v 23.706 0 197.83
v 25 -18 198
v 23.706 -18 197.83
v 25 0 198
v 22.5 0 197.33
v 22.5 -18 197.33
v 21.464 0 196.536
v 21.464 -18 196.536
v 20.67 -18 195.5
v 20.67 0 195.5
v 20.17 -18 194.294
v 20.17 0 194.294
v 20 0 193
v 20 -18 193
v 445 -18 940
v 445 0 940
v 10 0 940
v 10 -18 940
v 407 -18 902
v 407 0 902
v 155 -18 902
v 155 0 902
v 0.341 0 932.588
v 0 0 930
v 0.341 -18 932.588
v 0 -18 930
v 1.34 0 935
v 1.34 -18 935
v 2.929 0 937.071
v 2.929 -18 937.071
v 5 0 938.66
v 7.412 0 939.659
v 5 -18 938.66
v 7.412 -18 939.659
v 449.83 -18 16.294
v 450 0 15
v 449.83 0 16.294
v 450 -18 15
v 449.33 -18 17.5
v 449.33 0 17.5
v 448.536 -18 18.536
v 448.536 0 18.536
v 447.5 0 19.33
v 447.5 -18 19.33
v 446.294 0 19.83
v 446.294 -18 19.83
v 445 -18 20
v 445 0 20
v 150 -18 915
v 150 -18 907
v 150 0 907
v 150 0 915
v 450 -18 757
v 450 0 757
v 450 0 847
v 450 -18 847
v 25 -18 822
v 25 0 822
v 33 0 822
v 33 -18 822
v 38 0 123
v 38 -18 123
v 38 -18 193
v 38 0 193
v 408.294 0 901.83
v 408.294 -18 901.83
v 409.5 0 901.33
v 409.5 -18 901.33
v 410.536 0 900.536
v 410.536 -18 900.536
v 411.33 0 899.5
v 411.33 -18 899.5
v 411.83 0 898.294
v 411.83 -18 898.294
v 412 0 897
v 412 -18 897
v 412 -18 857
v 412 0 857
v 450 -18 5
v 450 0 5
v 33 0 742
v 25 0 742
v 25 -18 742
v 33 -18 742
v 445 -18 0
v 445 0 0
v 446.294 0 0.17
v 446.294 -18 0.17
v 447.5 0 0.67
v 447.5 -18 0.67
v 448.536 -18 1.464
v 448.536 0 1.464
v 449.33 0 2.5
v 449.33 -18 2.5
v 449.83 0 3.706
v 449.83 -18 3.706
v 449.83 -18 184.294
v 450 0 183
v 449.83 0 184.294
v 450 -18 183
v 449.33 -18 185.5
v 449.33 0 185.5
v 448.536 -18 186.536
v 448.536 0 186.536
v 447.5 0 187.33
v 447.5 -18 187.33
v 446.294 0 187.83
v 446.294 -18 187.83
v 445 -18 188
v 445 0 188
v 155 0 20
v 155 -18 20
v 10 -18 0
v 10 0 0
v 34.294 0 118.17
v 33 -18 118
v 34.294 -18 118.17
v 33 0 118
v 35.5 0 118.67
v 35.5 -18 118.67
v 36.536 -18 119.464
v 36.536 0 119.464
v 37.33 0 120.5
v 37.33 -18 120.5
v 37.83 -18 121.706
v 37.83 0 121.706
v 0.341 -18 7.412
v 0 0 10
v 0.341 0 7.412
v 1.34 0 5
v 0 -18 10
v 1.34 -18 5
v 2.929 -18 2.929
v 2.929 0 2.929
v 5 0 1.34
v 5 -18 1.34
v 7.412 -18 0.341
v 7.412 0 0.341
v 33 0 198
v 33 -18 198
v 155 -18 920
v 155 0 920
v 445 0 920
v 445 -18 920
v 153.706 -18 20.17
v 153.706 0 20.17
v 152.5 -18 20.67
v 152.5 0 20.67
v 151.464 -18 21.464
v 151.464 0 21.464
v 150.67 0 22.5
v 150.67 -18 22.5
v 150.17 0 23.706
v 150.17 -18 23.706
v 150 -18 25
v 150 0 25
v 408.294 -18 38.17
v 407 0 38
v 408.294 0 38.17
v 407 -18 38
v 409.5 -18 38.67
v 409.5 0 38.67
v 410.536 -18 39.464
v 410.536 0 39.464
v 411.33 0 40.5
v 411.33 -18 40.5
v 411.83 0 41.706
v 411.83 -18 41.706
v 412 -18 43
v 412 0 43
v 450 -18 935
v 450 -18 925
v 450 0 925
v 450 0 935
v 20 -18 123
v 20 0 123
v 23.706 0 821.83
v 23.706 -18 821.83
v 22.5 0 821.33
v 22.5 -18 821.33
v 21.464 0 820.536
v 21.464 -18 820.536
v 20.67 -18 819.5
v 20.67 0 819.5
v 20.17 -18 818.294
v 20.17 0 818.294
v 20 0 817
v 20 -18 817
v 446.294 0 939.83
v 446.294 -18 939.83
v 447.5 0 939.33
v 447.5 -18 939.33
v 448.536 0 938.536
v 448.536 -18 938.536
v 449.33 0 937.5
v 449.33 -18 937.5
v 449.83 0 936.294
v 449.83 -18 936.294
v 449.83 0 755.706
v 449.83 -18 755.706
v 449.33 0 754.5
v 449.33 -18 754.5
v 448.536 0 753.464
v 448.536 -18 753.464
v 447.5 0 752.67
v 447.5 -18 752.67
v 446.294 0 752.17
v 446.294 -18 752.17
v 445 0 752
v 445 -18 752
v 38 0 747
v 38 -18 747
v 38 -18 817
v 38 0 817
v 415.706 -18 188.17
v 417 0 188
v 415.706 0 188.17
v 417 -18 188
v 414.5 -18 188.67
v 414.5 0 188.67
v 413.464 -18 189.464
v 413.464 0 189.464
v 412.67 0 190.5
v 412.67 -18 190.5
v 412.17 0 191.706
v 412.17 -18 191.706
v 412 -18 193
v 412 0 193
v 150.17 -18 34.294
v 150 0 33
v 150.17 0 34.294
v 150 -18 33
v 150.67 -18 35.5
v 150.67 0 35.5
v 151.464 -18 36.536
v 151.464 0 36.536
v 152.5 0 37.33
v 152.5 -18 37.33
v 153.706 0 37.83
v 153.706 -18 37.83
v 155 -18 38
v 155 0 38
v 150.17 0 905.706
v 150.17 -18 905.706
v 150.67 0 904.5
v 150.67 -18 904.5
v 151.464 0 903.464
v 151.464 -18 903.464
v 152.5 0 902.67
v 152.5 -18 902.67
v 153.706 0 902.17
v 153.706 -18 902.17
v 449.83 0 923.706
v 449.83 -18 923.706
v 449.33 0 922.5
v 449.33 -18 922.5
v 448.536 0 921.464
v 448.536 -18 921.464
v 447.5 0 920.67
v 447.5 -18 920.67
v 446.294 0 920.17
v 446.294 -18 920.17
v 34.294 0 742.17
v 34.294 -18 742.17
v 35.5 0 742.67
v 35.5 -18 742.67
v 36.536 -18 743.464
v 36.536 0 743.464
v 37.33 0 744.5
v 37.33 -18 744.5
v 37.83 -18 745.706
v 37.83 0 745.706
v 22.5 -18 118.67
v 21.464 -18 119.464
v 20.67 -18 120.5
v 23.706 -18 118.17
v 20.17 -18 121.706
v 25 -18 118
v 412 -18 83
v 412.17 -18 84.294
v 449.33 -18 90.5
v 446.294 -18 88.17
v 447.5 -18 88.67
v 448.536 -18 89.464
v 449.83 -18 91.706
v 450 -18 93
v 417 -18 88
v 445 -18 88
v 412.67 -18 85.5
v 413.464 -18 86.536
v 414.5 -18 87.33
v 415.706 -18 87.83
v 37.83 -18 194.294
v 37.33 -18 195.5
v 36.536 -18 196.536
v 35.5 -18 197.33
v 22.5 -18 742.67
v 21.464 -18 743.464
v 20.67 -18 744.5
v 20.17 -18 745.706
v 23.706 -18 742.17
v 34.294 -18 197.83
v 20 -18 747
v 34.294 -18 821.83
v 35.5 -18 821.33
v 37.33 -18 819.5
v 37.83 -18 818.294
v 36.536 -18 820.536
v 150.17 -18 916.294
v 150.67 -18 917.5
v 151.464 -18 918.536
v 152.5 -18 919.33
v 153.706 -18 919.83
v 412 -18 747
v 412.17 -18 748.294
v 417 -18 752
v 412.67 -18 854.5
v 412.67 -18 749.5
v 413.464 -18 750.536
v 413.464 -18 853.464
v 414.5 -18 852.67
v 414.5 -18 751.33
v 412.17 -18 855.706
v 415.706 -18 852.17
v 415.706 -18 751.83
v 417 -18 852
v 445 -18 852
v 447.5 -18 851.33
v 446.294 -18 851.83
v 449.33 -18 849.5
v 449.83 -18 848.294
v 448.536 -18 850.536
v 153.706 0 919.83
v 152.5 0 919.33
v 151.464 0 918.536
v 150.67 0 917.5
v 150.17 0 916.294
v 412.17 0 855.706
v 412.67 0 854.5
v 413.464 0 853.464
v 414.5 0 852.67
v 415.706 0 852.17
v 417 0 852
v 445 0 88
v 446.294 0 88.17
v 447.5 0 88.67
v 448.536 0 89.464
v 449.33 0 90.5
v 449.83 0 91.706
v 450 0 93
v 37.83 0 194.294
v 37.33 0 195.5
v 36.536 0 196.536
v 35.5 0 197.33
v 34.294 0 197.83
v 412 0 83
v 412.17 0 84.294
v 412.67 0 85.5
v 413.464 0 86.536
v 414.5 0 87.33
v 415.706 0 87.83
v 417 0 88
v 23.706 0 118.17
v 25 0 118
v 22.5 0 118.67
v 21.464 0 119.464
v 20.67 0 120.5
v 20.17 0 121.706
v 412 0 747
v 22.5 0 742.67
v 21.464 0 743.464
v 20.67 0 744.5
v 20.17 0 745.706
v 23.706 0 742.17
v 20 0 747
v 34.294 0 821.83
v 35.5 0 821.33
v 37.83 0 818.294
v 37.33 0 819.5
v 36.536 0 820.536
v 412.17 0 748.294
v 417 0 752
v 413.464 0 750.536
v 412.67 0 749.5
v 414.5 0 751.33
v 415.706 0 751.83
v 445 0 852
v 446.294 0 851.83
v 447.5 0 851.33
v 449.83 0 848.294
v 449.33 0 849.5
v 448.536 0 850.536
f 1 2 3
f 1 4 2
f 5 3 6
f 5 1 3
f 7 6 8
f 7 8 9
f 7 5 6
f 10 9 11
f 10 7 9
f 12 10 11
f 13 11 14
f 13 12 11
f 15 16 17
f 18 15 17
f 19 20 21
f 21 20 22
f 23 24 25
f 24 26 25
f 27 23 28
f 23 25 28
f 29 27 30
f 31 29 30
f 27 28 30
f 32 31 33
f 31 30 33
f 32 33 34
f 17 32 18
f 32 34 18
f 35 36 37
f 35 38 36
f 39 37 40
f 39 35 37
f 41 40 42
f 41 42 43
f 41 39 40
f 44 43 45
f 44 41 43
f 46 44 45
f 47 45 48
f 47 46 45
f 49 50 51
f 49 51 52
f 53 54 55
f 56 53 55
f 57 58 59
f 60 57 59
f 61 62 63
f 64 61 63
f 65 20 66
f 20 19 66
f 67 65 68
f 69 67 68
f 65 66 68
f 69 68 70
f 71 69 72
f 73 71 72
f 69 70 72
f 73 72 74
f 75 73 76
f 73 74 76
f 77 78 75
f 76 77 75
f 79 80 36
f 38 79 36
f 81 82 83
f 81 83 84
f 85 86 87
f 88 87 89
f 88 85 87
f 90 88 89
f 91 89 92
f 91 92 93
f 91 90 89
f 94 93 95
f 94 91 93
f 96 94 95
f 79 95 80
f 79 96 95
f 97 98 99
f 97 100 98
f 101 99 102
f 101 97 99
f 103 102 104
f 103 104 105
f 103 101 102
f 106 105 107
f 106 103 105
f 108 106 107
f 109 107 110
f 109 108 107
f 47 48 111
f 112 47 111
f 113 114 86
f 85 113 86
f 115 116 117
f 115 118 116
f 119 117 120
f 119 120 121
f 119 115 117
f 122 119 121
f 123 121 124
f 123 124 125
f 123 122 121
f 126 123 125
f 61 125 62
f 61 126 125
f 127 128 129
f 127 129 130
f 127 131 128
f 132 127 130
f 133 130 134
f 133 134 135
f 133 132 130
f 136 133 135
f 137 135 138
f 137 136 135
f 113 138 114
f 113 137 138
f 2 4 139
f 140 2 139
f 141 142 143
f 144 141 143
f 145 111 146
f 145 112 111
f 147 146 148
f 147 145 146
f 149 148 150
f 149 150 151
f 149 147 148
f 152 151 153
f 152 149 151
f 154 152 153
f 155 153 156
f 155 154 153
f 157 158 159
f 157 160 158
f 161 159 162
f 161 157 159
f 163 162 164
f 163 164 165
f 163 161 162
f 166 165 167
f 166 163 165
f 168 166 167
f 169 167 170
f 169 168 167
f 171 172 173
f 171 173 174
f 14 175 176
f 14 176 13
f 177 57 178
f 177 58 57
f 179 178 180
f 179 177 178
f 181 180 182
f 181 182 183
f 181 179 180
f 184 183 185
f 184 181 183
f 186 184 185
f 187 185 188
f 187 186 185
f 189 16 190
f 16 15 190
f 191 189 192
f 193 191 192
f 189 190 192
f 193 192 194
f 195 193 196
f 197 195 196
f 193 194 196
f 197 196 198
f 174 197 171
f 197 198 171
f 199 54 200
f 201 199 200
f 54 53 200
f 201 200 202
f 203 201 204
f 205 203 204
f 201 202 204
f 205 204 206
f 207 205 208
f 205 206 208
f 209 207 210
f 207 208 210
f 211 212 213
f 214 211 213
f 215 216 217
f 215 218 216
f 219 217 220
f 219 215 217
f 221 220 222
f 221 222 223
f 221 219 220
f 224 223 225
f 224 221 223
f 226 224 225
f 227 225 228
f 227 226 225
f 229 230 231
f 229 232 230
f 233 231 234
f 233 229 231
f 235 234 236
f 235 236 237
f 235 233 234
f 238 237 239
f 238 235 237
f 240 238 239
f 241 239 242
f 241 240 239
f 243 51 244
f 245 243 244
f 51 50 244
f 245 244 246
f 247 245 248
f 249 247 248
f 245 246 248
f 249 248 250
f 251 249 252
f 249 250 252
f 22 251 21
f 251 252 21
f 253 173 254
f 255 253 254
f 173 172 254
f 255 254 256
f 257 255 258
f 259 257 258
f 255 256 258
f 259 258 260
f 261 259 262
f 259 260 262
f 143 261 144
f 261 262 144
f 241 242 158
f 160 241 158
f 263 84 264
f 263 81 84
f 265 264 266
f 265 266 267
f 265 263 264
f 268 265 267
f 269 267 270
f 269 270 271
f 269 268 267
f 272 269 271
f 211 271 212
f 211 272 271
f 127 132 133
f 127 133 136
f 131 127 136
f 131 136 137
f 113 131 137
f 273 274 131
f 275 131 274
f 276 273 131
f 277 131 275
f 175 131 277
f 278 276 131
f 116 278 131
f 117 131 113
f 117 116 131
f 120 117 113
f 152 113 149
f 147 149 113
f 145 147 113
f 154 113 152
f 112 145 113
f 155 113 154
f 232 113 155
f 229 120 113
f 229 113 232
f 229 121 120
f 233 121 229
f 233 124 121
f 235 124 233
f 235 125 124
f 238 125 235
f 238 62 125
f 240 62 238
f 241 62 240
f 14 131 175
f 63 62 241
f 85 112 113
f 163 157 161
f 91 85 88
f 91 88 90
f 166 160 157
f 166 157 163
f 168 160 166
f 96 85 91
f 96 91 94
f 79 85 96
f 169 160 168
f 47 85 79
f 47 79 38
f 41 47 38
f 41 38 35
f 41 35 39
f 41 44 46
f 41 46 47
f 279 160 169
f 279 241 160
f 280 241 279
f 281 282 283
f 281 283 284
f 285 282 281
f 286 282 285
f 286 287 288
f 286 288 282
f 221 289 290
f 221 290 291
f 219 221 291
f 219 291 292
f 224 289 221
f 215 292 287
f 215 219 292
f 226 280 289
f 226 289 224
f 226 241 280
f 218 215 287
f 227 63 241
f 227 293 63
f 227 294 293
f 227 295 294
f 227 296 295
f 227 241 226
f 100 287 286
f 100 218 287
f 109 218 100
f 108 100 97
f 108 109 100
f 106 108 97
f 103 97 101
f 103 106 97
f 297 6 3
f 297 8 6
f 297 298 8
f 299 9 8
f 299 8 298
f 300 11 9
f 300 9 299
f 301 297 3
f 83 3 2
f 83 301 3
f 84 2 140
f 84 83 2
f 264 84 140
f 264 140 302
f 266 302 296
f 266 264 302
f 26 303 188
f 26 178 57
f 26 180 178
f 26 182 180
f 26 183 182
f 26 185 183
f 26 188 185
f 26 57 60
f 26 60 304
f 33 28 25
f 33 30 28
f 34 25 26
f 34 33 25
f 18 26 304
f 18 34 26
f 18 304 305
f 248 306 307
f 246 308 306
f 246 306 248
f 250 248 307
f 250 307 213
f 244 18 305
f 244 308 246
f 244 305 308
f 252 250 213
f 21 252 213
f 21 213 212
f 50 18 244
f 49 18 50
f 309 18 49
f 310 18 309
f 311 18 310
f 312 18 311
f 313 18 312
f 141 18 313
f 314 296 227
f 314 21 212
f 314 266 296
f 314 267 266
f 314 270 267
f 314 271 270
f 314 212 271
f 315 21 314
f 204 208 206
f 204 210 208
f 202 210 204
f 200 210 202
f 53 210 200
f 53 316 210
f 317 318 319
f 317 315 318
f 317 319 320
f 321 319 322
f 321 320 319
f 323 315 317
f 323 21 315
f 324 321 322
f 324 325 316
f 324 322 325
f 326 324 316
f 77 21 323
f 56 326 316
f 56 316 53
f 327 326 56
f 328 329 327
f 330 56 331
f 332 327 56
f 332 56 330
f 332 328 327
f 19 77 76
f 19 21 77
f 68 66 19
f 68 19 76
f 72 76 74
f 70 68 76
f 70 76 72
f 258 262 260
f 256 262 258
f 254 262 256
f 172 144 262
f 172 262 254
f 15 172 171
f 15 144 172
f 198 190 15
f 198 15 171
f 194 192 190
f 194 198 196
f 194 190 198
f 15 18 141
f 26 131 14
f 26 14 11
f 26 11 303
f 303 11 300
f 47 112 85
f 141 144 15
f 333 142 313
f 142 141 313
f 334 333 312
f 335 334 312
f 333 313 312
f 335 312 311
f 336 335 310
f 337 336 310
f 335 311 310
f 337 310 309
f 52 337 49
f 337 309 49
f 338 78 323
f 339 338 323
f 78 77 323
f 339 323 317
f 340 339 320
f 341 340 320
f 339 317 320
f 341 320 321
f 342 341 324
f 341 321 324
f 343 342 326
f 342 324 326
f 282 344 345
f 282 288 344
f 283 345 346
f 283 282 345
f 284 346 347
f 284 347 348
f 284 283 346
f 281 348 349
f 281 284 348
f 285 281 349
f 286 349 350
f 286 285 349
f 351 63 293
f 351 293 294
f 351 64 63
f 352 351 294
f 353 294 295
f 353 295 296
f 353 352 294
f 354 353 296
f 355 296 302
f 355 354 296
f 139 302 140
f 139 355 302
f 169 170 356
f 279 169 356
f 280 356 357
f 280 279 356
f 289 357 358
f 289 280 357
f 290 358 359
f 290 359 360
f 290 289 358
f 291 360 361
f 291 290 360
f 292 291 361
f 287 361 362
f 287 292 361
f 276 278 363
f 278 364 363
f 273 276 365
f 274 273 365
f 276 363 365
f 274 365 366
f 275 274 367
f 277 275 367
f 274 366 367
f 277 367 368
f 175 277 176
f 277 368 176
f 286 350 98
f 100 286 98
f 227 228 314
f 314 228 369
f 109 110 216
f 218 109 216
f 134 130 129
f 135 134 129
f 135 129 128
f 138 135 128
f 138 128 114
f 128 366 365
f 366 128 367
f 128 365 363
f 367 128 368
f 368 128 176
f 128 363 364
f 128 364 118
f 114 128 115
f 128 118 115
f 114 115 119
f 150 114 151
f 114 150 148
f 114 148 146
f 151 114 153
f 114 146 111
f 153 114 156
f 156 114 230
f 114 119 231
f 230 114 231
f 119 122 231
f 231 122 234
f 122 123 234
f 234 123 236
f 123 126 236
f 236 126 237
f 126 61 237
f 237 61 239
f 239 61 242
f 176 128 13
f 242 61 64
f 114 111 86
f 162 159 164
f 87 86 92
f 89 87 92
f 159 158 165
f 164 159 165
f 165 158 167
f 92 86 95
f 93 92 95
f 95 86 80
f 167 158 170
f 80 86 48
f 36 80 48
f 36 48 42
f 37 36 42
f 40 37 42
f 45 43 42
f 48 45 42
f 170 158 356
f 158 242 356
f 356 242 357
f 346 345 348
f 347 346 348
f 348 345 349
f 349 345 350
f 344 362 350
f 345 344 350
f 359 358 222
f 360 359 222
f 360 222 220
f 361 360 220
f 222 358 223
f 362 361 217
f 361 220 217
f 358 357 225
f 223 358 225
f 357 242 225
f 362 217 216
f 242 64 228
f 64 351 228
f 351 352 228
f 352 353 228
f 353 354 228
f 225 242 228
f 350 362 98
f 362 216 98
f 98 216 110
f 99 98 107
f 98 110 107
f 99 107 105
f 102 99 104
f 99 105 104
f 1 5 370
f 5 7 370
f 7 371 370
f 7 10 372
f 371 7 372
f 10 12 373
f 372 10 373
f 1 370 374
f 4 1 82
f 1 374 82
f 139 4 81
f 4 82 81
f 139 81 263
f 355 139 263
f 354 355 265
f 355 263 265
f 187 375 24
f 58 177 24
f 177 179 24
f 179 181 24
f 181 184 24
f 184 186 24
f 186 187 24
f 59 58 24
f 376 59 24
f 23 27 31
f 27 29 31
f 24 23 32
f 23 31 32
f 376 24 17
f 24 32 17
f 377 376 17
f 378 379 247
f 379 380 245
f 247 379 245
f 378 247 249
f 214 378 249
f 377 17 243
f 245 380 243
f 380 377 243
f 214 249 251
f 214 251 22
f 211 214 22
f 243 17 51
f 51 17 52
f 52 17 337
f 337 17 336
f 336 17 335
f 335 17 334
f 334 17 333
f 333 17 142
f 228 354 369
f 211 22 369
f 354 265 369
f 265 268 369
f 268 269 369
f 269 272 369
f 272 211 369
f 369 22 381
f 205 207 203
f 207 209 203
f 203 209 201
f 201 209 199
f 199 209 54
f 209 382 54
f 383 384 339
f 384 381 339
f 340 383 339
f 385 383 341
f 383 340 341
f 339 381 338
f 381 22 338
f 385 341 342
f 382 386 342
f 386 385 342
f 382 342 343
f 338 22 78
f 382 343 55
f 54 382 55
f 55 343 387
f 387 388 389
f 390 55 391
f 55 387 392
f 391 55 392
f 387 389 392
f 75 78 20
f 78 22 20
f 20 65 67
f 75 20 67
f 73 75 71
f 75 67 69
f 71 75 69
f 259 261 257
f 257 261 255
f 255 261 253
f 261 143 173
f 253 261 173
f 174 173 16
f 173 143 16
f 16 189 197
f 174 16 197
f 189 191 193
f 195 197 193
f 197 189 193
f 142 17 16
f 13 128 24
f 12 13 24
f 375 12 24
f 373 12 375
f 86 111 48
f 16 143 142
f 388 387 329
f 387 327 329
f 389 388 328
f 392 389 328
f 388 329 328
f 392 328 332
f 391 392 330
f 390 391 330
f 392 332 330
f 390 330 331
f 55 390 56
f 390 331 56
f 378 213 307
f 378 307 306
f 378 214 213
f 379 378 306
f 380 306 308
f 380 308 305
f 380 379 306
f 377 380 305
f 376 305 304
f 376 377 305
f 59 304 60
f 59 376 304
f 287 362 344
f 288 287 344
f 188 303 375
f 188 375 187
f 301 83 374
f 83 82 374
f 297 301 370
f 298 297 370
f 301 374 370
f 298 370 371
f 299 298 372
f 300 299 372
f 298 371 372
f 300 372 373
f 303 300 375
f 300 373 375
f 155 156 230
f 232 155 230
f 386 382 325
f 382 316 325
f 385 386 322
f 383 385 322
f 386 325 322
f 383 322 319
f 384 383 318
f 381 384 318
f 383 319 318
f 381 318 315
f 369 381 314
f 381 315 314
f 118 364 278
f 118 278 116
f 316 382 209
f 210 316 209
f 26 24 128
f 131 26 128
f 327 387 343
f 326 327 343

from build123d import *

# Parameters (mm, degrees)
F1_DEPTH = 18
F2_W     = 18
F2_H     = 80
F3_DEPTH = 25
F4_R     = 10
F5_R     = 5
F6_R     = 5
F7_R     = 5


# Not quite as in the source:
# - two fillets or chamfers of one size are made in one step


with BuildPart() as f1:
    # F0 (on Front) → F1 (new body)
    with BuildSketch(Plane.XZ):
        Polygon((0, 940), (0, 0), (450, 0), (450, 20), (150, 20), (150, 38), (412, 38), (412, 88), (450, 88), (450, 188), (412, 188), (412, 752), (450, 752), (450, 852), (412, 852), (412, 902), (150, 902), (150, 920), (450, 920), (450, 940), align=None)
    extrude(amount=F1_DEPTH)

    # F2 (on face) → F3 (cut)
    with BuildSketch(Plane.XZ.offset(18)):
        with Locations((29, 782)):
            Rectangle(F2_W, F2_H)
        with Locations((29, 158)):
            Rectangle(F2_W, F2_H)
    extrude(amount=-F3_DEPTH, mode=Mode.SUBTRACT)

    # F4
    f4_edges = [f1.edges().sort_by_distance(p)[0] for p in [
        (0, -9, 0),
        (0, -9, 940),
    ]]
    fillet(f4_edges, radius=F4_R)

    # F5
    f5_edges = [f1.edges().sort_by_distance(p)[0] for p in [
        (20, -9, 822),
        (38, -9, 822),
        (20, -9, 742),
        (38, -9, 742),
    ]]
    fillet(f5_edges, radius=F5_R)

    # F6
    f6_edges = [f1.edges().sort_by_distance(p)[0] for p in [
        (38, -9, 198),
        (20, -9, 198),
        (20, -9, 118),
        (38, -9, 118),
    ]]
    fillet(f6_edges, radius=F6_R)

    # F7
    f7_edges = [f1.edges().sort_by_distance(p)[0] for p in [
        (450, -9, 0),
        (450, -9, 20),
        (150, -9, 38),
        (150, -9, 20),
        (450, -9, 940),
        (450, -9, 920),
        (150, -9, 920),
        (150, -9, 902),
        (412, -9, 902),
        (412, -9, 38),
        (412, -9, 852),
        (412, -9, 88),
        (450, -9, 852),
        (450, -9, 88),
        (450, -9, 752),
        (450, -9, 188),
        (412, -9, 752),
        (412, -9, 188),
    ]]
    fillet(f7_edges, radius=F7_R)


solid = f1.part
